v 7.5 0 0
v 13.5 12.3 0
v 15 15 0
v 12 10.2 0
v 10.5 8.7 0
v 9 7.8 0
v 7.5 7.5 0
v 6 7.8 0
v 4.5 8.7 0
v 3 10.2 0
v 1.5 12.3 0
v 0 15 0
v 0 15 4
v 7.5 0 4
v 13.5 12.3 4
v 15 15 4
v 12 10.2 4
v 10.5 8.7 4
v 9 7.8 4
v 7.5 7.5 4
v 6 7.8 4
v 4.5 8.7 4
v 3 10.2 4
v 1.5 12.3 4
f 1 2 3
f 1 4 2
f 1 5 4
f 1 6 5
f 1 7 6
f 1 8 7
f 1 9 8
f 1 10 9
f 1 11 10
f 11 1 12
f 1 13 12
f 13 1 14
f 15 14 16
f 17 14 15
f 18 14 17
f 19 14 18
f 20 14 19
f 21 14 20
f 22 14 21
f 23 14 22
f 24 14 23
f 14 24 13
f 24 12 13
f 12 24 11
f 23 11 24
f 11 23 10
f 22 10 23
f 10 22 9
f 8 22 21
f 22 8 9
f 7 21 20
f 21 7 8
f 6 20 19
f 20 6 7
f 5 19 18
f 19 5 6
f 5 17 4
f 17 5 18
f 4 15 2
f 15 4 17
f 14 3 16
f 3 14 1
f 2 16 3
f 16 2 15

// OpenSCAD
// Origin from https://www.thingiverse.com/thing:8443

joinfactor = 0.125;

gFocalPoint = [0,0];
gSteps = 10;
gHeight = 4;

BezQuadCurve( [[0, 15],[5,5],[10,5],[15,15]], [7.5,0], gSteps, gHeight);

//=======================================
// Functions
//=======================================
function BEZ03(u) = pow((1-u), 3);
function BEZ13(u) = 3*u*(pow((1-u),2));
function BEZ23(u) = 3*(pow(u,2))*(1-u);
function BEZ33(u) = pow(u,3);

function PointAlongBez4(p0, p1, p2, p3, u) = [
	BEZ03(u)*p0[0]+BEZ13(u)*p1[0]+BEZ23(u)*p2[0]+BEZ33(u)*p3[0],
	BEZ03(u)*p0[1]+BEZ13(u)*p1[1]+BEZ23(u)*p2[1]+BEZ33(u)*p3[1]];

//=======================================
// Modules
//=======================================
// c - ControlPoints (4 points)
module BezQuadCurve(c, focalPoint=gFocalPoint, steps=gSteps, height=gHeight, debug=false)
{
	if (debug) {
  	// Draw control points
		for(point=[0:3]) {
			translate(c[point])
			color([1,0,0])
			cylinder(r=1, h=height+joinfactor);
		}
	}

	for(step = [steps:1])
	{
		linear_extrude(height = height, convexity = 10) 
		polygon(
			points=[
				focalPoint,
				PointAlongBez4(c[0], c[1], c[2],c[3], step/steps),
				PointAlongBez4(c[0], c[1], c[2],c[3], (step-1)/steps)],
			paths=[[0,1,2,0]]
		);
	}
}

//==============================================
// Test functions
//==============================================
//PlotBEZ0(100);
//PlotBEZ1(100);
//PlotBEZ2(100);
//PlotBEZ3(100);
//PlotBez4Blending();


module PlotBEZ0(steps)
{
	cubeSize = 1;
	cubeHeight = steps;

	for (step=[0:steps])
	{
		translate([cubeSize*step, 0, 0])
		cube(size=[cubeSize, cubeSize, BEZ03(step/steps)*cubeHeight]);
	}	
}

module PlotBEZ1(steps)
{
	cubeSize = 1;
	cubeHeight = steps;

	for (step=[0:steps])
	{
		translate([cubeSize*step, 0, 0])
		cube(size=[cubeSize, cubeSize, BEZ13(step/steps)*cubeHeight]);
	}	
}

module PlotBEZ2(steps)
{
	cubeSize = 1;
	cubeHeight = steps;

	for (step=[0:steps])
	{
		translate([cubeSize*step, 0, 0])
		cube(size=[cubeSize, cubeSize, BEZ23(step/steps)*cubeHeight]);
	}	
}

module PlotBEZ3(steps)
{
	cubeSize = 1;
	cubeHeight = steps;

	for (step=[0:steps])
	{
		translate([cubeSize*step, 0, 0])
		cube(size=[cubeSize, cubeSize, BEZ33(step/steps)*cubeHeight]);
	}	
}

module PlotBez4Blending()
{
	sizing = 100;

	translate([0, 0, sizing + 10])
	PlotBEZ0(100);

	translate([sizing+10, 0, sizing + 10])
	PlotBEZ1(100);

	translate([0, 0, 0])
	PlotBEZ2(100);

	translate([sizing+10, 0, 0])
	PlotBEZ3(100);
}
